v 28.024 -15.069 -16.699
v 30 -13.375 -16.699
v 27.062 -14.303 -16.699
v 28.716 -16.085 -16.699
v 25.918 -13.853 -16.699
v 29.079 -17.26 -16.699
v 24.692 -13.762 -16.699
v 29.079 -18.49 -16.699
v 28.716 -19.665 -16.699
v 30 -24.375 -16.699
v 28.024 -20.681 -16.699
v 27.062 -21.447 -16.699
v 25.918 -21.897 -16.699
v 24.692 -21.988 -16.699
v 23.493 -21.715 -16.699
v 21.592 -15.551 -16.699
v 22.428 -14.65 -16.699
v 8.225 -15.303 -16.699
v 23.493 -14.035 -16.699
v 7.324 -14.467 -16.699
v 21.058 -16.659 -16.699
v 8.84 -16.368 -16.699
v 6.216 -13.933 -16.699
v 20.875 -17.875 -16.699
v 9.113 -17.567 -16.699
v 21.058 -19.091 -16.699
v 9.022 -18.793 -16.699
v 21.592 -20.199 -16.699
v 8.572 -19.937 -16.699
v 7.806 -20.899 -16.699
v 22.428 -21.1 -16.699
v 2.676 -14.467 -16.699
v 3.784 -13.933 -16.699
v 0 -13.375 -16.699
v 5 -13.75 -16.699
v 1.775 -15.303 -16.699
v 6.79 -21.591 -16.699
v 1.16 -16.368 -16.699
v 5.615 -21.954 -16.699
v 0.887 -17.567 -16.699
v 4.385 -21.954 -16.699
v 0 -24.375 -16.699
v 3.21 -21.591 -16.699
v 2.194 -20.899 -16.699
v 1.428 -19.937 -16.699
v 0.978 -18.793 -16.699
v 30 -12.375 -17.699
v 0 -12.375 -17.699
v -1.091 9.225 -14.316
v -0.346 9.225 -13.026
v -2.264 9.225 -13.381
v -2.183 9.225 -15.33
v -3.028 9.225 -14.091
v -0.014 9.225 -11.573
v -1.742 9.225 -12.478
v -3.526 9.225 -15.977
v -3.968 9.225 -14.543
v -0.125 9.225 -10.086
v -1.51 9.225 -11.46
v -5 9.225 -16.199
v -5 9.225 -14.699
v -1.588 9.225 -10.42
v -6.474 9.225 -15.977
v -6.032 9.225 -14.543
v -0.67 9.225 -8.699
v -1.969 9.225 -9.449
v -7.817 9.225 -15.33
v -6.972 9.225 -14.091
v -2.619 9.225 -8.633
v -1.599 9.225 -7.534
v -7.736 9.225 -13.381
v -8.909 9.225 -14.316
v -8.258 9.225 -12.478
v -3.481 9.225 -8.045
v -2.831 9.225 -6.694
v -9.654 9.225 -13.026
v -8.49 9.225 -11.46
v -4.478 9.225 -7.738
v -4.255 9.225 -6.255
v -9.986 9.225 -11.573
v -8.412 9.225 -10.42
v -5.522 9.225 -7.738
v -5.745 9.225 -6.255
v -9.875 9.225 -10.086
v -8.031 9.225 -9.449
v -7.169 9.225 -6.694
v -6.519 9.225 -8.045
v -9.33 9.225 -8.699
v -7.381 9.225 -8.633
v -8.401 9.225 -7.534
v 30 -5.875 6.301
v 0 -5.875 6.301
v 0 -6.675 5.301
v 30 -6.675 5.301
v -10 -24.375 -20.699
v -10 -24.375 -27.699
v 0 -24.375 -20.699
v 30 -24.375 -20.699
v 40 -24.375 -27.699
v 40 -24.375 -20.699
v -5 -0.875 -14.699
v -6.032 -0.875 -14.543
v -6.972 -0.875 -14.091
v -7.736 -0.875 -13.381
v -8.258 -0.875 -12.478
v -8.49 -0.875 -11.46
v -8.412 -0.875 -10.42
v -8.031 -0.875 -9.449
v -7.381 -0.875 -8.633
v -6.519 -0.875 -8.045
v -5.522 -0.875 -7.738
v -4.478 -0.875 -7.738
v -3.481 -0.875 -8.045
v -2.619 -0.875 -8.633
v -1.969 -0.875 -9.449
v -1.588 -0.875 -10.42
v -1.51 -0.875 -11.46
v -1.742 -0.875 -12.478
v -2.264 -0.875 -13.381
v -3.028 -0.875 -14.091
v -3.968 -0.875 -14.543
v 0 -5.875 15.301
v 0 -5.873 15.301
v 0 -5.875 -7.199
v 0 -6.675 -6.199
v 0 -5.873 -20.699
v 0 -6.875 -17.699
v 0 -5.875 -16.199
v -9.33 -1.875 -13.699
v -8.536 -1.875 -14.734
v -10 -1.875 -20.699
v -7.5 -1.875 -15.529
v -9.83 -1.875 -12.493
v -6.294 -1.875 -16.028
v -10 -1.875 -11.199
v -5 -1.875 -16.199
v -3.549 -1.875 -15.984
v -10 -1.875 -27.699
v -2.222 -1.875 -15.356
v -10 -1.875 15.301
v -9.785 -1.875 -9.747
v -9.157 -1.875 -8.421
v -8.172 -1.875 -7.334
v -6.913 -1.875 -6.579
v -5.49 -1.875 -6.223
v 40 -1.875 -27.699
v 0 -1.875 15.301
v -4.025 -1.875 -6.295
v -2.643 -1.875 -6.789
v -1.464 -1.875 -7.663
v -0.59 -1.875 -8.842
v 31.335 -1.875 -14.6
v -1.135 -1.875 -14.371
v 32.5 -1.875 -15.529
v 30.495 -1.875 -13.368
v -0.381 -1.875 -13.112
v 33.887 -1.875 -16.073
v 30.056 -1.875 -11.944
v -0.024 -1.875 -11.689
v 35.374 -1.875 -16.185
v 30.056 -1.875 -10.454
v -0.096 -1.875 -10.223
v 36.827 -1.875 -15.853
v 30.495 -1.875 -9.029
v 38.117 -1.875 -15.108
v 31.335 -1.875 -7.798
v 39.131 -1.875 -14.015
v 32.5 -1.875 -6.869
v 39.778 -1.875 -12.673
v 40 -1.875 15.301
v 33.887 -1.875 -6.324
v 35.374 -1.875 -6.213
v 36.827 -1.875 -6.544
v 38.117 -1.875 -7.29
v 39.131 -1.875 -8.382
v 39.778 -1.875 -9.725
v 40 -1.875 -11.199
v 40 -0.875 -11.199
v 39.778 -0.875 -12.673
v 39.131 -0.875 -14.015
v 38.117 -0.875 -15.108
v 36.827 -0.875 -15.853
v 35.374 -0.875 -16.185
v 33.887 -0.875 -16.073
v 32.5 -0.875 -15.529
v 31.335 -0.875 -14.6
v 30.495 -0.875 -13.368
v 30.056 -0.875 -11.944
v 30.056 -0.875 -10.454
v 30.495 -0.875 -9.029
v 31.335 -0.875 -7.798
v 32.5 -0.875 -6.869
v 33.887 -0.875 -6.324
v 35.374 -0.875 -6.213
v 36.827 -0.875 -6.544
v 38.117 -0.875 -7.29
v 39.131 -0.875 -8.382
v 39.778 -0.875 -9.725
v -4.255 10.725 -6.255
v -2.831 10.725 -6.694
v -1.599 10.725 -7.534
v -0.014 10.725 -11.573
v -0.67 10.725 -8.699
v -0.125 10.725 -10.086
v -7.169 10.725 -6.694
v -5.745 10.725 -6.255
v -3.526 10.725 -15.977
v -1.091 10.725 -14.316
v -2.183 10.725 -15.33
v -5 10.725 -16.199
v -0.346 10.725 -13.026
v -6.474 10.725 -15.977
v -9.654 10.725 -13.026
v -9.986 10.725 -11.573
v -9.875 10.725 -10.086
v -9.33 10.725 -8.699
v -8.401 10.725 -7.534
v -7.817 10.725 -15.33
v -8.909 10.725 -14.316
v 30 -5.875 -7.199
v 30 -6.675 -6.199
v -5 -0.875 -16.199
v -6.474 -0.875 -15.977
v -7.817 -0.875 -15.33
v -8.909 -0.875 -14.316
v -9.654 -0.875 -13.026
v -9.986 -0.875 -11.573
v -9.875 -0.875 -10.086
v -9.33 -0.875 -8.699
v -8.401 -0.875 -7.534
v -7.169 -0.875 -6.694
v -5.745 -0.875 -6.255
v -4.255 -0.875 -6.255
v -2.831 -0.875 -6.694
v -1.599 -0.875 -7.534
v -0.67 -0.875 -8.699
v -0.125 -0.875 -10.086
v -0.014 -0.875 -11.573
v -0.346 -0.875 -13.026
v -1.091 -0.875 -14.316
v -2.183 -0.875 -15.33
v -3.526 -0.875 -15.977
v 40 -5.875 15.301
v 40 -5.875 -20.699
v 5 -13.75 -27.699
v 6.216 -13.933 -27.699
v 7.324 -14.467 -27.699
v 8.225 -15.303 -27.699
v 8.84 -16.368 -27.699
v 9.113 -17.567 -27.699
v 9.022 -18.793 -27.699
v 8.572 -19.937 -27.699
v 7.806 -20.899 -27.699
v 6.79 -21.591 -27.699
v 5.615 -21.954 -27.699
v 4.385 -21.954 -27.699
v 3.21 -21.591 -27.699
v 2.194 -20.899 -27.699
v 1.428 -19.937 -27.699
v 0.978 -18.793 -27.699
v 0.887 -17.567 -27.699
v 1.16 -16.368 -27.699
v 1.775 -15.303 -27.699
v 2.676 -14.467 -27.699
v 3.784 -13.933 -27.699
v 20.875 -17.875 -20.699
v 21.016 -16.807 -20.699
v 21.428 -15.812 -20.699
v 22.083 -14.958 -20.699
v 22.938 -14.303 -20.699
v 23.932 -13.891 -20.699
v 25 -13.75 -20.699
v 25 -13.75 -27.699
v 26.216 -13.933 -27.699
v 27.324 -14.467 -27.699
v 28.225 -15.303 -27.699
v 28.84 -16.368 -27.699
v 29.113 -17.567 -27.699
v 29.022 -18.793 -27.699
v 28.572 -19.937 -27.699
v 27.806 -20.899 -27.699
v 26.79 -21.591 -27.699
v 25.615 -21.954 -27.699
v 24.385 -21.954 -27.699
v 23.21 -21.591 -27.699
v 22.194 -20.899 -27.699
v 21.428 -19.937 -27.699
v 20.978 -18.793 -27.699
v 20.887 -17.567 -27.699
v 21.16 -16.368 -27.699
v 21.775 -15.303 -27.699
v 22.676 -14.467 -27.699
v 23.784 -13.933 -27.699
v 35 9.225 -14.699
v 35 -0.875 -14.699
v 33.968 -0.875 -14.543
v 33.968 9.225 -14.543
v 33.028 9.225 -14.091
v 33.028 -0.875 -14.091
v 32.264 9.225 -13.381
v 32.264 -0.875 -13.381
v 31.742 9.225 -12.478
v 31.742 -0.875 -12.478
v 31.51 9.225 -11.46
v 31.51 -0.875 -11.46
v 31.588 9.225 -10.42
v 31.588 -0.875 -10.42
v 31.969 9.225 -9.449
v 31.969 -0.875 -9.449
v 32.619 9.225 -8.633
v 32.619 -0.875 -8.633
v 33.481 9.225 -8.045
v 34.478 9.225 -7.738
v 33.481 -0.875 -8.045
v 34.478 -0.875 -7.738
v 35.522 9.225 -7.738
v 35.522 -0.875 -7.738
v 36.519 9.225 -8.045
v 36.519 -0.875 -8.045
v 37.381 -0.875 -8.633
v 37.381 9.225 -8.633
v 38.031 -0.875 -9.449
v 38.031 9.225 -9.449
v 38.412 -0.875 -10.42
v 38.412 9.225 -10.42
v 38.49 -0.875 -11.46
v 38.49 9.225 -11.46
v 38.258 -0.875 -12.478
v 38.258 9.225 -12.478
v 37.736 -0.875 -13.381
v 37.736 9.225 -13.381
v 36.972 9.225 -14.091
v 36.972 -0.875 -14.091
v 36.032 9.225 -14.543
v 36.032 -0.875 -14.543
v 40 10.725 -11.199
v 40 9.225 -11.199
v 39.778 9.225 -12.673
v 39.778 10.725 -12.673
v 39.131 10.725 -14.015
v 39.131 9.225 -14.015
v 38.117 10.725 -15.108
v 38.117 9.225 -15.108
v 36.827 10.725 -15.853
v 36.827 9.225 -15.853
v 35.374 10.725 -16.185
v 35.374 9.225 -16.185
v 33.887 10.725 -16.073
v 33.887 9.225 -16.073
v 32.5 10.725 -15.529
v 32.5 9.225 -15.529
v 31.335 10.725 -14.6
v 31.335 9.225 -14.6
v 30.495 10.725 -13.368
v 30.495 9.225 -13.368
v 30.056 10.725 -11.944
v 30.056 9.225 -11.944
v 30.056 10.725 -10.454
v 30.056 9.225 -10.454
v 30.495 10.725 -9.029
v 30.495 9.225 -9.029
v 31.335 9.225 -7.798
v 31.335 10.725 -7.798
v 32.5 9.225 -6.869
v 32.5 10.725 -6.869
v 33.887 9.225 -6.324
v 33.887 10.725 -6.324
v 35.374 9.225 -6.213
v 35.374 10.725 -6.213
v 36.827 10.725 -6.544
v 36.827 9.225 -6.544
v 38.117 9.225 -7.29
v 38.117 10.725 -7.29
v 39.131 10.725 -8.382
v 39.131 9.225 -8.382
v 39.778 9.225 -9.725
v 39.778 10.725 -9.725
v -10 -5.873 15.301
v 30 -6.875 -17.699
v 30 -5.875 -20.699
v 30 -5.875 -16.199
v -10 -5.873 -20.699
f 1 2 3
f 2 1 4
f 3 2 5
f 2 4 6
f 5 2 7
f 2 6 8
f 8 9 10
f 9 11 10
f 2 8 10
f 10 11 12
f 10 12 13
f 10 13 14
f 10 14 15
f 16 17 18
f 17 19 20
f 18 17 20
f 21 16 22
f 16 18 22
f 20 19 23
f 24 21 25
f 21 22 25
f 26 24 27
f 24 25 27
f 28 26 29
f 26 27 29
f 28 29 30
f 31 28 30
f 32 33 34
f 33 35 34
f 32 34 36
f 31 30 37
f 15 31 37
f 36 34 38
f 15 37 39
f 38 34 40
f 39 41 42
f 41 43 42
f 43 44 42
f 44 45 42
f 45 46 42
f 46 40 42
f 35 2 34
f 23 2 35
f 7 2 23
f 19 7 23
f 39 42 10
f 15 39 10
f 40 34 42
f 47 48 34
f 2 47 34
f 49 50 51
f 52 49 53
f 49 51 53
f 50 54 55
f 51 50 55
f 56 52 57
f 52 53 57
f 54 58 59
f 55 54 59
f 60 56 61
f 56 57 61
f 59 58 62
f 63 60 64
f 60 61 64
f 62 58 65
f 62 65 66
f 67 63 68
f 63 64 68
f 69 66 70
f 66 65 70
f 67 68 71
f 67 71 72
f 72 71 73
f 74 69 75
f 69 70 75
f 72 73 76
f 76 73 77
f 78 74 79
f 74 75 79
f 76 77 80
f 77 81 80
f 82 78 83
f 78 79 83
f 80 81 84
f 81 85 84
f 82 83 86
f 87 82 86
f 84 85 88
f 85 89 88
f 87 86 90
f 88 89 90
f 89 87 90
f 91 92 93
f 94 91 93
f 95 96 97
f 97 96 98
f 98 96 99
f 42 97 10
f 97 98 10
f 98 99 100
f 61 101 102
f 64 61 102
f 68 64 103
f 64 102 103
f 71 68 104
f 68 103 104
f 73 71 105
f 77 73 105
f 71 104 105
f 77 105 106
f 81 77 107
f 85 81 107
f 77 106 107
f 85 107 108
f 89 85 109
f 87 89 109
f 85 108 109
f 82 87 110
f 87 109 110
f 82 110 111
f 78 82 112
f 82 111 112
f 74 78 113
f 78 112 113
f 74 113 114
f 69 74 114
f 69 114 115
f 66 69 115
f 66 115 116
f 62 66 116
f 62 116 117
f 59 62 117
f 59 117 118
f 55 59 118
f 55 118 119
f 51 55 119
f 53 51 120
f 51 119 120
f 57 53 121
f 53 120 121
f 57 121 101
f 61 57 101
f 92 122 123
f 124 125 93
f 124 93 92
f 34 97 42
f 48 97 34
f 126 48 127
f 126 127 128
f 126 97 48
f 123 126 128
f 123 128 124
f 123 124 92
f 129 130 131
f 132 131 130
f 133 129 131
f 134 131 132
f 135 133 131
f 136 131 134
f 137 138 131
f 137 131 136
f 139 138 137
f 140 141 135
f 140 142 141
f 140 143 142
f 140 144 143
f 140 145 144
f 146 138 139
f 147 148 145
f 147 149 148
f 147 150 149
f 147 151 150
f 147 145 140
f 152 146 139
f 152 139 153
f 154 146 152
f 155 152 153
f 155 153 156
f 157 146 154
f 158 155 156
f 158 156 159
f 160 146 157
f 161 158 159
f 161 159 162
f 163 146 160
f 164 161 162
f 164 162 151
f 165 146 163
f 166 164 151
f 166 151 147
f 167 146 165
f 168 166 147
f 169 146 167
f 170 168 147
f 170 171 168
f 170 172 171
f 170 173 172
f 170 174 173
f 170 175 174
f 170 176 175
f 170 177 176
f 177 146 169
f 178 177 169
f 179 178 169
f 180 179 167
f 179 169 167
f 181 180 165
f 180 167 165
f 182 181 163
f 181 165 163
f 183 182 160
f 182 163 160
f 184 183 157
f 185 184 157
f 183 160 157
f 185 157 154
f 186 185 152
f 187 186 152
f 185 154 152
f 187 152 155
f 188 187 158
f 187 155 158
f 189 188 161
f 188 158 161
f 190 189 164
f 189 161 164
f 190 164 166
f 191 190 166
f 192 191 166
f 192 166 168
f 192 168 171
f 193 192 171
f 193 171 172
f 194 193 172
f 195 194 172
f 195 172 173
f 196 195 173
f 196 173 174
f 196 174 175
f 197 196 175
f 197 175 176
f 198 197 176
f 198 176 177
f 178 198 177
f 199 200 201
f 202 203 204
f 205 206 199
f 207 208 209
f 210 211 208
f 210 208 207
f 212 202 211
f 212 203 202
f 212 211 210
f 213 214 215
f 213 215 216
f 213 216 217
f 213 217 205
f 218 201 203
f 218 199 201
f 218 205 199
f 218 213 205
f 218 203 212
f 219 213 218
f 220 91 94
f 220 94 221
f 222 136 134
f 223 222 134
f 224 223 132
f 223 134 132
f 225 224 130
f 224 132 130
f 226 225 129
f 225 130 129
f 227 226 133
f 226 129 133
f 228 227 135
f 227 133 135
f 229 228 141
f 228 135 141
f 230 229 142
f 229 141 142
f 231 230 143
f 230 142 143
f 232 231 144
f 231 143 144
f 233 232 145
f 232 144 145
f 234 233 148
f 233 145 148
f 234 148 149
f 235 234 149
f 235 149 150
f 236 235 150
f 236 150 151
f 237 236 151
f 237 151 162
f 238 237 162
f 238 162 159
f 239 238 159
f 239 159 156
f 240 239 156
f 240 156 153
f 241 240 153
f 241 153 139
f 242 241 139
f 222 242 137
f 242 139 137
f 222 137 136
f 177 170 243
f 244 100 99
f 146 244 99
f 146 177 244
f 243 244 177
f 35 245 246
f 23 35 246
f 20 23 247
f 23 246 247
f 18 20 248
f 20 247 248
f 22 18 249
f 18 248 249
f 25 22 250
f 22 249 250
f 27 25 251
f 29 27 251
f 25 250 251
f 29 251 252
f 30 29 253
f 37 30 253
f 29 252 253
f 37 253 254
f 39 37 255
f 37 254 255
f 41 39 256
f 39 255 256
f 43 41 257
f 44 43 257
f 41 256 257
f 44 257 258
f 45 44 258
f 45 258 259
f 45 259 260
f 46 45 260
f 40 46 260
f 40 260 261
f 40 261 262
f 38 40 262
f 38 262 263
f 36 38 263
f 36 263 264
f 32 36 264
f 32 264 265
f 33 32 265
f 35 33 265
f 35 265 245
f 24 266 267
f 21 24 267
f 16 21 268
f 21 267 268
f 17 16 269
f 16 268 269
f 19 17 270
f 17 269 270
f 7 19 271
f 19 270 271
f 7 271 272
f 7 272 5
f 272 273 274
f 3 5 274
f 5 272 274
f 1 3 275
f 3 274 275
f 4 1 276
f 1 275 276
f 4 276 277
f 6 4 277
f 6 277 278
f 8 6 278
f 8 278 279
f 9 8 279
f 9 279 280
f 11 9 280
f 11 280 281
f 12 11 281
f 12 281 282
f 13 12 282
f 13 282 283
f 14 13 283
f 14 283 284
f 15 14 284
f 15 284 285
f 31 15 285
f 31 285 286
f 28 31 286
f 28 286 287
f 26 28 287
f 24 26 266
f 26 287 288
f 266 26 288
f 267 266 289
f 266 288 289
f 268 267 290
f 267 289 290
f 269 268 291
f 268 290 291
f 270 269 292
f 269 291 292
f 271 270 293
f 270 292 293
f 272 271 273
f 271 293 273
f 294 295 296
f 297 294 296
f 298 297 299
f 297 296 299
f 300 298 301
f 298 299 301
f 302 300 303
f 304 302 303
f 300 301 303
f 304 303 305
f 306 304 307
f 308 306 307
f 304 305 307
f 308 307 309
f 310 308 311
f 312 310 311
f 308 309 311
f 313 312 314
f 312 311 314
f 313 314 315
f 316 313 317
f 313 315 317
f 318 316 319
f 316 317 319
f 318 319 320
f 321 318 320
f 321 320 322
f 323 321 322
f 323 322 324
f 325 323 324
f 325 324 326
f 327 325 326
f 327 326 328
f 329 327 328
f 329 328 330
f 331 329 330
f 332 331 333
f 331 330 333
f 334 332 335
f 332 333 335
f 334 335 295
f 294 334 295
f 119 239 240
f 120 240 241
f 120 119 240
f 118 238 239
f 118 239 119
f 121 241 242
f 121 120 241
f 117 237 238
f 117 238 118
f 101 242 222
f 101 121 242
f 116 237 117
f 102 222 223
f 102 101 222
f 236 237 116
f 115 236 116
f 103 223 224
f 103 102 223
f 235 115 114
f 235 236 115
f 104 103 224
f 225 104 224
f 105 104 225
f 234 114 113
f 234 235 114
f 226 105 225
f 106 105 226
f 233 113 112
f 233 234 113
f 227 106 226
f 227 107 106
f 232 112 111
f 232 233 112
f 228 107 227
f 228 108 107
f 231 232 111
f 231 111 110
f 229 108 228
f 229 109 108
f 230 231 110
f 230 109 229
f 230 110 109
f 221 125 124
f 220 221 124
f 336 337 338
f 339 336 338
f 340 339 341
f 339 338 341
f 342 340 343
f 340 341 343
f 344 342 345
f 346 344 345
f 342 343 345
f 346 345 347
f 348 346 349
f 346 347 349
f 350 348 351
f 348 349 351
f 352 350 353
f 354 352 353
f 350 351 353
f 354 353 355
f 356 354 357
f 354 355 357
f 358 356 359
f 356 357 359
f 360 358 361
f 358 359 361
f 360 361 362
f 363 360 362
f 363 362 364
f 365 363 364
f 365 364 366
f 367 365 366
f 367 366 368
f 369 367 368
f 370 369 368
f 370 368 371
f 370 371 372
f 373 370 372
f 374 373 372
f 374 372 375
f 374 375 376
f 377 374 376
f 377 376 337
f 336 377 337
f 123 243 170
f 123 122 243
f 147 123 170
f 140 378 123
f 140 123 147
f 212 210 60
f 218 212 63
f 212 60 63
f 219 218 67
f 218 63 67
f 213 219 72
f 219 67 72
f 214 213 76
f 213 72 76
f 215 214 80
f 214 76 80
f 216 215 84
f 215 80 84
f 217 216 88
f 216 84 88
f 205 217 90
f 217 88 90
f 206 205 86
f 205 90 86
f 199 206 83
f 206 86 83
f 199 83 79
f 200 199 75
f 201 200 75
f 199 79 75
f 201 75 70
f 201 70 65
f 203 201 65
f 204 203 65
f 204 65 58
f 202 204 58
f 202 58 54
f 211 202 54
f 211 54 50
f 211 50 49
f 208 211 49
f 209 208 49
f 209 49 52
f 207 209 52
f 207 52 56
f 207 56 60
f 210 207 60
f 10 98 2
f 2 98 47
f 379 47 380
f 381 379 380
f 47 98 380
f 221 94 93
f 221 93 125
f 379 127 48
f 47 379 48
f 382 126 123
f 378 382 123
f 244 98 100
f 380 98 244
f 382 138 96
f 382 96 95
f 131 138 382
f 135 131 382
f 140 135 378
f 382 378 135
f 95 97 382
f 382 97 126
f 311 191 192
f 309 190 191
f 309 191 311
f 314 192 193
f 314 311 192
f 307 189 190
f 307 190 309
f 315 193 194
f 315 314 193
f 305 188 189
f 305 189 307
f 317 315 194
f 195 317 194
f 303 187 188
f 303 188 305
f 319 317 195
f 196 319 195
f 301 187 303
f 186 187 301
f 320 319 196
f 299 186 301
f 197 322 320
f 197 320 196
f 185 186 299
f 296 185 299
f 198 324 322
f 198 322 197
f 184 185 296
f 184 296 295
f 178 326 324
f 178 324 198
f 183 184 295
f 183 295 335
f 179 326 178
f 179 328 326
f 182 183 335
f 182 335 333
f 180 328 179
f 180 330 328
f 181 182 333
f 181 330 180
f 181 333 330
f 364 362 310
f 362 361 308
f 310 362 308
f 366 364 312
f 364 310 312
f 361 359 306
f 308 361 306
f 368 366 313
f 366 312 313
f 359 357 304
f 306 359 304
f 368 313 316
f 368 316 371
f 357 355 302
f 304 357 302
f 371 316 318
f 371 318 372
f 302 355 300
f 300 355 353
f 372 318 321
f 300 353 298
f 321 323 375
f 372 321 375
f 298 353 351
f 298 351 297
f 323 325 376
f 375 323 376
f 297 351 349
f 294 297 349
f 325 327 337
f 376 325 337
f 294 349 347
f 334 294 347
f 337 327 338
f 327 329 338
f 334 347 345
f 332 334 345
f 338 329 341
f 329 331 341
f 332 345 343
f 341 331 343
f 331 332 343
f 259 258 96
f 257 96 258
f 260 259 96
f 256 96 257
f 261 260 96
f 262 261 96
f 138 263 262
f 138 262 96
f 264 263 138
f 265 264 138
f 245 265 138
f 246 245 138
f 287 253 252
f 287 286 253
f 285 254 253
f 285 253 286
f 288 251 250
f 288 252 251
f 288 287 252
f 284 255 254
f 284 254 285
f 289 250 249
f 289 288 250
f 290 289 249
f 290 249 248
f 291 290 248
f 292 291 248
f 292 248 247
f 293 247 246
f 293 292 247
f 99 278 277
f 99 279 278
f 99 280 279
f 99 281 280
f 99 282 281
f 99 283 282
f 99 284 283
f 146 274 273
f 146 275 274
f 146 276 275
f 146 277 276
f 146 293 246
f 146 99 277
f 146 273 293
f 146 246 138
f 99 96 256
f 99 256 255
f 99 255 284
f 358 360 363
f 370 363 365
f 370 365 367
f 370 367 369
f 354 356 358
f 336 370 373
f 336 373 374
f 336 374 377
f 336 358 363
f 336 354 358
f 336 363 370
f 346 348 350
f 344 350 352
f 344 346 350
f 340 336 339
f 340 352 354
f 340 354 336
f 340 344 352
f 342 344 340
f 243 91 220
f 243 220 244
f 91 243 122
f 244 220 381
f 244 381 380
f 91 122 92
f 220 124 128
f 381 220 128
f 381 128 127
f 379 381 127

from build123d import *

# Parameters (mm, degrees)
BOSS_EXTRUDE1_DEPTH = 30
SKETCH2_R           = 4.125
CUT_EXTRUDE1_DEPTH  = 53.821779702
SKETCH3_W           = 36
SKETCH3_H           = 3.997849999
BOSS_EXTRUDE2_DEPTH = 10
SKETCH4_W           = 36
SKETCH4_H           = 4
BOSS_EXTRUDE3_DEPTH = 10
SKETCH5_R           = 5
BOSS_EXTRUDE4_DEPTH = 12.6
BOSS_EXTRUDE5_START = 7
SKETCH6_W           = 30
SKETCH6_H           = 22.5
SKETCH6_R           = 4.125
BOSS_EXTRUDE5_DEPTH = 7
SKETCH8_R           = 5
SKETCH8_R_2         = 3.5
CUT_EXTRUDE2_DEPTH  = 10.1
SKETCH9_W           = 7
SKETCH9_H           = 22.5
BOSS_EXTRUDE6_DEPTH = 10
SKETCH10_W          = 7
SKETCH10_H          = 22.5
BOSS_EXTRUDE7_DEPTH = 10


with BuildPart() as part:
    # Sketch1 → Boss-Extrude1 (new body)
    with BuildSketch(Plane(origin=(0, 0, 0), x_dir=(0, 0, -1), z_dir=(1, 0, 0))):
        Polygon((16.698859865, -1.874995608), (-15.301140135, -1.874995608), (-15.301140135, -5.874995608), (-6.301140135, -5.874995608), (-5.301140135, -6.674995608), (6.198859865, -6.674995608), (7.198859865, -5.874995608), (16.198859865, -5.874995608), (17.698859865, -6.874995608), (17.698859865, -12.374995608), (16.698859865, -13.374995608), (16.698859865, -24.374995608), (20.698859865, -24.374995608), (20.698859865, -1.874995608), align=None)
    extrude(amount=BOSS_EXTRUDE1_DEPTH)

    # Sketch2 → Cut-Extrude1 (cut, through all)
    with BuildSketch(Plane(origin=(0, 0, -20.698859865), x_dir=(-1, 0, 0), z_dir=(0, 0, -1))):
        with Locations((-25, -17.874995608)):
            Circle(SKETCH2_R)
        with Locations(Location((-5, -17.874995608, 0), (0, 0, 90))):
            Circle(SKETCH2_R)
    extrude(amount=-CUT_EXTRUDE1_DEPTH, mode=Mode.SUBTRACT)

    # Sketch3 → Boss-Extrude2 (add)
    with BuildSketch(Plane.ZY):
        with Locations((-2.698859865, -3.873920608)):
            Rectangle(SKETCH3_W, SKETCH3_H)
    extrude(amount=BOSS_EXTRUDE2_DEPTH)

    # Sketch4 → Boss-Extrude3 (add)
    with BuildSketch(Plane(origin=(30, 0, 0), x_dir=(0, 0, -1), z_dir=(1, 0, 0))):
        with Locations((2.698859865, -3.874995608)):
            Rectangle(SKETCH4_W, SKETCH4_H)
    extrude(amount=BOSS_EXTRUDE3_DEPTH)

    # Sketch5 → Boss-Extrude4 (add)
    with BuildSketch(Plane(origin=(0, -1.874995608, 0), x_dir=(1, 0, 0), z_dir=(0, 1, 0))):
        with Locations((35, 11.198859865)):
            Circle(SKETCH5_R)
        with Locations(Location((-5, 11.198859865, 0), (0, 0, 90))):
            Circle(SKETCH5_R)
    extrude(amount=BOSS_EXTRUDE4_DEPTH)

    # Sketch6 → Boss-Extrude5 (add)
    with BuildSketch(Plane(origin=(0, 0, -20.698859865), x_dir=(-1, 0, 0), z_dir=(0, 0, -1)).offset(BOSS_EXTRUDE5_START)):
        with Locations((-15, -13.124995608)):
            Rectangle(SKETCH6_W, SKETCH6_H)
        with Locations(Location((-25, -17.874995608, 0), (0, 0, 90))):
            Circle(SKETCH6_R, mode=Mode.SUBTRACT)
        with Locations(Location((-5, -17.874995608, 0), (0, 0, 90))):
            Circle(SKETCH6_R, mode=Mode.SUBTRACT)
    extrude(amount=-BOSS_EXTRUDE5_DEPTH)

    # Sketch8 → Cut-Extrude2 (cut)
    # profile 1 of 2: a face of its own
    with BuildSketch(Plane(origin=(0, -0.874995608, 0), x_dir=(1, 0, 0), z_dir=(0, 1, 0))):
        with Locations(Location((-5, 11.198859865, 0), (0, 0, 180))):
            Circle(SKETCH8_R)
        with Locations(Location((-5, 11.198859865, 0), (0, 0, 90))):
            Circle(SKETCH8_R_2, mode=Mode.SUBTRACT)
    # profile 2 of 2: a face of its own
    with BuildSketch(Plane(origin=(0, -0.874995608, 0), x_dir=(1, 0, 0), z_dir=(0, 1, 0))):
        with Locations((35, 11.198859865)):
            Circle(SKETCH8_R)
        with Locations(Location((35, 11.198859865, 0), (0, 0, 90))):
            Circle(SKETCH8_R_2, mode=Mode.SUBTRACT)
    extrude(amount=CUT_EXTRUDE2_DEPTH, mode=Mode.SUBTRACT)

    # Sketch9 → Boss-Extrude6 (add)
    with BuildSketch(Plane(origin=(30, 0, 0), x_dir=(0, 0, -1), z_dir=(1, 0, 0))):
        with Locations((24.198859865, -13.124995608)):
            Rectangle(SKETCH9_W, SKETCH9_H)
    extrude(amount=BOSS_EXTRUDE6_DEPTH)

    # Sketch10 → Boss-Extrude7 (add)
    with BuildSketch(Plane.ZY):
        with Locations((-24.198859865, -13.124995608)):
            Rectangle(SKETCH10_W, SKETCH10_H)
    extrude(amount=BOSS_EXTRUDE7_DEPTH)


solid = part.part
